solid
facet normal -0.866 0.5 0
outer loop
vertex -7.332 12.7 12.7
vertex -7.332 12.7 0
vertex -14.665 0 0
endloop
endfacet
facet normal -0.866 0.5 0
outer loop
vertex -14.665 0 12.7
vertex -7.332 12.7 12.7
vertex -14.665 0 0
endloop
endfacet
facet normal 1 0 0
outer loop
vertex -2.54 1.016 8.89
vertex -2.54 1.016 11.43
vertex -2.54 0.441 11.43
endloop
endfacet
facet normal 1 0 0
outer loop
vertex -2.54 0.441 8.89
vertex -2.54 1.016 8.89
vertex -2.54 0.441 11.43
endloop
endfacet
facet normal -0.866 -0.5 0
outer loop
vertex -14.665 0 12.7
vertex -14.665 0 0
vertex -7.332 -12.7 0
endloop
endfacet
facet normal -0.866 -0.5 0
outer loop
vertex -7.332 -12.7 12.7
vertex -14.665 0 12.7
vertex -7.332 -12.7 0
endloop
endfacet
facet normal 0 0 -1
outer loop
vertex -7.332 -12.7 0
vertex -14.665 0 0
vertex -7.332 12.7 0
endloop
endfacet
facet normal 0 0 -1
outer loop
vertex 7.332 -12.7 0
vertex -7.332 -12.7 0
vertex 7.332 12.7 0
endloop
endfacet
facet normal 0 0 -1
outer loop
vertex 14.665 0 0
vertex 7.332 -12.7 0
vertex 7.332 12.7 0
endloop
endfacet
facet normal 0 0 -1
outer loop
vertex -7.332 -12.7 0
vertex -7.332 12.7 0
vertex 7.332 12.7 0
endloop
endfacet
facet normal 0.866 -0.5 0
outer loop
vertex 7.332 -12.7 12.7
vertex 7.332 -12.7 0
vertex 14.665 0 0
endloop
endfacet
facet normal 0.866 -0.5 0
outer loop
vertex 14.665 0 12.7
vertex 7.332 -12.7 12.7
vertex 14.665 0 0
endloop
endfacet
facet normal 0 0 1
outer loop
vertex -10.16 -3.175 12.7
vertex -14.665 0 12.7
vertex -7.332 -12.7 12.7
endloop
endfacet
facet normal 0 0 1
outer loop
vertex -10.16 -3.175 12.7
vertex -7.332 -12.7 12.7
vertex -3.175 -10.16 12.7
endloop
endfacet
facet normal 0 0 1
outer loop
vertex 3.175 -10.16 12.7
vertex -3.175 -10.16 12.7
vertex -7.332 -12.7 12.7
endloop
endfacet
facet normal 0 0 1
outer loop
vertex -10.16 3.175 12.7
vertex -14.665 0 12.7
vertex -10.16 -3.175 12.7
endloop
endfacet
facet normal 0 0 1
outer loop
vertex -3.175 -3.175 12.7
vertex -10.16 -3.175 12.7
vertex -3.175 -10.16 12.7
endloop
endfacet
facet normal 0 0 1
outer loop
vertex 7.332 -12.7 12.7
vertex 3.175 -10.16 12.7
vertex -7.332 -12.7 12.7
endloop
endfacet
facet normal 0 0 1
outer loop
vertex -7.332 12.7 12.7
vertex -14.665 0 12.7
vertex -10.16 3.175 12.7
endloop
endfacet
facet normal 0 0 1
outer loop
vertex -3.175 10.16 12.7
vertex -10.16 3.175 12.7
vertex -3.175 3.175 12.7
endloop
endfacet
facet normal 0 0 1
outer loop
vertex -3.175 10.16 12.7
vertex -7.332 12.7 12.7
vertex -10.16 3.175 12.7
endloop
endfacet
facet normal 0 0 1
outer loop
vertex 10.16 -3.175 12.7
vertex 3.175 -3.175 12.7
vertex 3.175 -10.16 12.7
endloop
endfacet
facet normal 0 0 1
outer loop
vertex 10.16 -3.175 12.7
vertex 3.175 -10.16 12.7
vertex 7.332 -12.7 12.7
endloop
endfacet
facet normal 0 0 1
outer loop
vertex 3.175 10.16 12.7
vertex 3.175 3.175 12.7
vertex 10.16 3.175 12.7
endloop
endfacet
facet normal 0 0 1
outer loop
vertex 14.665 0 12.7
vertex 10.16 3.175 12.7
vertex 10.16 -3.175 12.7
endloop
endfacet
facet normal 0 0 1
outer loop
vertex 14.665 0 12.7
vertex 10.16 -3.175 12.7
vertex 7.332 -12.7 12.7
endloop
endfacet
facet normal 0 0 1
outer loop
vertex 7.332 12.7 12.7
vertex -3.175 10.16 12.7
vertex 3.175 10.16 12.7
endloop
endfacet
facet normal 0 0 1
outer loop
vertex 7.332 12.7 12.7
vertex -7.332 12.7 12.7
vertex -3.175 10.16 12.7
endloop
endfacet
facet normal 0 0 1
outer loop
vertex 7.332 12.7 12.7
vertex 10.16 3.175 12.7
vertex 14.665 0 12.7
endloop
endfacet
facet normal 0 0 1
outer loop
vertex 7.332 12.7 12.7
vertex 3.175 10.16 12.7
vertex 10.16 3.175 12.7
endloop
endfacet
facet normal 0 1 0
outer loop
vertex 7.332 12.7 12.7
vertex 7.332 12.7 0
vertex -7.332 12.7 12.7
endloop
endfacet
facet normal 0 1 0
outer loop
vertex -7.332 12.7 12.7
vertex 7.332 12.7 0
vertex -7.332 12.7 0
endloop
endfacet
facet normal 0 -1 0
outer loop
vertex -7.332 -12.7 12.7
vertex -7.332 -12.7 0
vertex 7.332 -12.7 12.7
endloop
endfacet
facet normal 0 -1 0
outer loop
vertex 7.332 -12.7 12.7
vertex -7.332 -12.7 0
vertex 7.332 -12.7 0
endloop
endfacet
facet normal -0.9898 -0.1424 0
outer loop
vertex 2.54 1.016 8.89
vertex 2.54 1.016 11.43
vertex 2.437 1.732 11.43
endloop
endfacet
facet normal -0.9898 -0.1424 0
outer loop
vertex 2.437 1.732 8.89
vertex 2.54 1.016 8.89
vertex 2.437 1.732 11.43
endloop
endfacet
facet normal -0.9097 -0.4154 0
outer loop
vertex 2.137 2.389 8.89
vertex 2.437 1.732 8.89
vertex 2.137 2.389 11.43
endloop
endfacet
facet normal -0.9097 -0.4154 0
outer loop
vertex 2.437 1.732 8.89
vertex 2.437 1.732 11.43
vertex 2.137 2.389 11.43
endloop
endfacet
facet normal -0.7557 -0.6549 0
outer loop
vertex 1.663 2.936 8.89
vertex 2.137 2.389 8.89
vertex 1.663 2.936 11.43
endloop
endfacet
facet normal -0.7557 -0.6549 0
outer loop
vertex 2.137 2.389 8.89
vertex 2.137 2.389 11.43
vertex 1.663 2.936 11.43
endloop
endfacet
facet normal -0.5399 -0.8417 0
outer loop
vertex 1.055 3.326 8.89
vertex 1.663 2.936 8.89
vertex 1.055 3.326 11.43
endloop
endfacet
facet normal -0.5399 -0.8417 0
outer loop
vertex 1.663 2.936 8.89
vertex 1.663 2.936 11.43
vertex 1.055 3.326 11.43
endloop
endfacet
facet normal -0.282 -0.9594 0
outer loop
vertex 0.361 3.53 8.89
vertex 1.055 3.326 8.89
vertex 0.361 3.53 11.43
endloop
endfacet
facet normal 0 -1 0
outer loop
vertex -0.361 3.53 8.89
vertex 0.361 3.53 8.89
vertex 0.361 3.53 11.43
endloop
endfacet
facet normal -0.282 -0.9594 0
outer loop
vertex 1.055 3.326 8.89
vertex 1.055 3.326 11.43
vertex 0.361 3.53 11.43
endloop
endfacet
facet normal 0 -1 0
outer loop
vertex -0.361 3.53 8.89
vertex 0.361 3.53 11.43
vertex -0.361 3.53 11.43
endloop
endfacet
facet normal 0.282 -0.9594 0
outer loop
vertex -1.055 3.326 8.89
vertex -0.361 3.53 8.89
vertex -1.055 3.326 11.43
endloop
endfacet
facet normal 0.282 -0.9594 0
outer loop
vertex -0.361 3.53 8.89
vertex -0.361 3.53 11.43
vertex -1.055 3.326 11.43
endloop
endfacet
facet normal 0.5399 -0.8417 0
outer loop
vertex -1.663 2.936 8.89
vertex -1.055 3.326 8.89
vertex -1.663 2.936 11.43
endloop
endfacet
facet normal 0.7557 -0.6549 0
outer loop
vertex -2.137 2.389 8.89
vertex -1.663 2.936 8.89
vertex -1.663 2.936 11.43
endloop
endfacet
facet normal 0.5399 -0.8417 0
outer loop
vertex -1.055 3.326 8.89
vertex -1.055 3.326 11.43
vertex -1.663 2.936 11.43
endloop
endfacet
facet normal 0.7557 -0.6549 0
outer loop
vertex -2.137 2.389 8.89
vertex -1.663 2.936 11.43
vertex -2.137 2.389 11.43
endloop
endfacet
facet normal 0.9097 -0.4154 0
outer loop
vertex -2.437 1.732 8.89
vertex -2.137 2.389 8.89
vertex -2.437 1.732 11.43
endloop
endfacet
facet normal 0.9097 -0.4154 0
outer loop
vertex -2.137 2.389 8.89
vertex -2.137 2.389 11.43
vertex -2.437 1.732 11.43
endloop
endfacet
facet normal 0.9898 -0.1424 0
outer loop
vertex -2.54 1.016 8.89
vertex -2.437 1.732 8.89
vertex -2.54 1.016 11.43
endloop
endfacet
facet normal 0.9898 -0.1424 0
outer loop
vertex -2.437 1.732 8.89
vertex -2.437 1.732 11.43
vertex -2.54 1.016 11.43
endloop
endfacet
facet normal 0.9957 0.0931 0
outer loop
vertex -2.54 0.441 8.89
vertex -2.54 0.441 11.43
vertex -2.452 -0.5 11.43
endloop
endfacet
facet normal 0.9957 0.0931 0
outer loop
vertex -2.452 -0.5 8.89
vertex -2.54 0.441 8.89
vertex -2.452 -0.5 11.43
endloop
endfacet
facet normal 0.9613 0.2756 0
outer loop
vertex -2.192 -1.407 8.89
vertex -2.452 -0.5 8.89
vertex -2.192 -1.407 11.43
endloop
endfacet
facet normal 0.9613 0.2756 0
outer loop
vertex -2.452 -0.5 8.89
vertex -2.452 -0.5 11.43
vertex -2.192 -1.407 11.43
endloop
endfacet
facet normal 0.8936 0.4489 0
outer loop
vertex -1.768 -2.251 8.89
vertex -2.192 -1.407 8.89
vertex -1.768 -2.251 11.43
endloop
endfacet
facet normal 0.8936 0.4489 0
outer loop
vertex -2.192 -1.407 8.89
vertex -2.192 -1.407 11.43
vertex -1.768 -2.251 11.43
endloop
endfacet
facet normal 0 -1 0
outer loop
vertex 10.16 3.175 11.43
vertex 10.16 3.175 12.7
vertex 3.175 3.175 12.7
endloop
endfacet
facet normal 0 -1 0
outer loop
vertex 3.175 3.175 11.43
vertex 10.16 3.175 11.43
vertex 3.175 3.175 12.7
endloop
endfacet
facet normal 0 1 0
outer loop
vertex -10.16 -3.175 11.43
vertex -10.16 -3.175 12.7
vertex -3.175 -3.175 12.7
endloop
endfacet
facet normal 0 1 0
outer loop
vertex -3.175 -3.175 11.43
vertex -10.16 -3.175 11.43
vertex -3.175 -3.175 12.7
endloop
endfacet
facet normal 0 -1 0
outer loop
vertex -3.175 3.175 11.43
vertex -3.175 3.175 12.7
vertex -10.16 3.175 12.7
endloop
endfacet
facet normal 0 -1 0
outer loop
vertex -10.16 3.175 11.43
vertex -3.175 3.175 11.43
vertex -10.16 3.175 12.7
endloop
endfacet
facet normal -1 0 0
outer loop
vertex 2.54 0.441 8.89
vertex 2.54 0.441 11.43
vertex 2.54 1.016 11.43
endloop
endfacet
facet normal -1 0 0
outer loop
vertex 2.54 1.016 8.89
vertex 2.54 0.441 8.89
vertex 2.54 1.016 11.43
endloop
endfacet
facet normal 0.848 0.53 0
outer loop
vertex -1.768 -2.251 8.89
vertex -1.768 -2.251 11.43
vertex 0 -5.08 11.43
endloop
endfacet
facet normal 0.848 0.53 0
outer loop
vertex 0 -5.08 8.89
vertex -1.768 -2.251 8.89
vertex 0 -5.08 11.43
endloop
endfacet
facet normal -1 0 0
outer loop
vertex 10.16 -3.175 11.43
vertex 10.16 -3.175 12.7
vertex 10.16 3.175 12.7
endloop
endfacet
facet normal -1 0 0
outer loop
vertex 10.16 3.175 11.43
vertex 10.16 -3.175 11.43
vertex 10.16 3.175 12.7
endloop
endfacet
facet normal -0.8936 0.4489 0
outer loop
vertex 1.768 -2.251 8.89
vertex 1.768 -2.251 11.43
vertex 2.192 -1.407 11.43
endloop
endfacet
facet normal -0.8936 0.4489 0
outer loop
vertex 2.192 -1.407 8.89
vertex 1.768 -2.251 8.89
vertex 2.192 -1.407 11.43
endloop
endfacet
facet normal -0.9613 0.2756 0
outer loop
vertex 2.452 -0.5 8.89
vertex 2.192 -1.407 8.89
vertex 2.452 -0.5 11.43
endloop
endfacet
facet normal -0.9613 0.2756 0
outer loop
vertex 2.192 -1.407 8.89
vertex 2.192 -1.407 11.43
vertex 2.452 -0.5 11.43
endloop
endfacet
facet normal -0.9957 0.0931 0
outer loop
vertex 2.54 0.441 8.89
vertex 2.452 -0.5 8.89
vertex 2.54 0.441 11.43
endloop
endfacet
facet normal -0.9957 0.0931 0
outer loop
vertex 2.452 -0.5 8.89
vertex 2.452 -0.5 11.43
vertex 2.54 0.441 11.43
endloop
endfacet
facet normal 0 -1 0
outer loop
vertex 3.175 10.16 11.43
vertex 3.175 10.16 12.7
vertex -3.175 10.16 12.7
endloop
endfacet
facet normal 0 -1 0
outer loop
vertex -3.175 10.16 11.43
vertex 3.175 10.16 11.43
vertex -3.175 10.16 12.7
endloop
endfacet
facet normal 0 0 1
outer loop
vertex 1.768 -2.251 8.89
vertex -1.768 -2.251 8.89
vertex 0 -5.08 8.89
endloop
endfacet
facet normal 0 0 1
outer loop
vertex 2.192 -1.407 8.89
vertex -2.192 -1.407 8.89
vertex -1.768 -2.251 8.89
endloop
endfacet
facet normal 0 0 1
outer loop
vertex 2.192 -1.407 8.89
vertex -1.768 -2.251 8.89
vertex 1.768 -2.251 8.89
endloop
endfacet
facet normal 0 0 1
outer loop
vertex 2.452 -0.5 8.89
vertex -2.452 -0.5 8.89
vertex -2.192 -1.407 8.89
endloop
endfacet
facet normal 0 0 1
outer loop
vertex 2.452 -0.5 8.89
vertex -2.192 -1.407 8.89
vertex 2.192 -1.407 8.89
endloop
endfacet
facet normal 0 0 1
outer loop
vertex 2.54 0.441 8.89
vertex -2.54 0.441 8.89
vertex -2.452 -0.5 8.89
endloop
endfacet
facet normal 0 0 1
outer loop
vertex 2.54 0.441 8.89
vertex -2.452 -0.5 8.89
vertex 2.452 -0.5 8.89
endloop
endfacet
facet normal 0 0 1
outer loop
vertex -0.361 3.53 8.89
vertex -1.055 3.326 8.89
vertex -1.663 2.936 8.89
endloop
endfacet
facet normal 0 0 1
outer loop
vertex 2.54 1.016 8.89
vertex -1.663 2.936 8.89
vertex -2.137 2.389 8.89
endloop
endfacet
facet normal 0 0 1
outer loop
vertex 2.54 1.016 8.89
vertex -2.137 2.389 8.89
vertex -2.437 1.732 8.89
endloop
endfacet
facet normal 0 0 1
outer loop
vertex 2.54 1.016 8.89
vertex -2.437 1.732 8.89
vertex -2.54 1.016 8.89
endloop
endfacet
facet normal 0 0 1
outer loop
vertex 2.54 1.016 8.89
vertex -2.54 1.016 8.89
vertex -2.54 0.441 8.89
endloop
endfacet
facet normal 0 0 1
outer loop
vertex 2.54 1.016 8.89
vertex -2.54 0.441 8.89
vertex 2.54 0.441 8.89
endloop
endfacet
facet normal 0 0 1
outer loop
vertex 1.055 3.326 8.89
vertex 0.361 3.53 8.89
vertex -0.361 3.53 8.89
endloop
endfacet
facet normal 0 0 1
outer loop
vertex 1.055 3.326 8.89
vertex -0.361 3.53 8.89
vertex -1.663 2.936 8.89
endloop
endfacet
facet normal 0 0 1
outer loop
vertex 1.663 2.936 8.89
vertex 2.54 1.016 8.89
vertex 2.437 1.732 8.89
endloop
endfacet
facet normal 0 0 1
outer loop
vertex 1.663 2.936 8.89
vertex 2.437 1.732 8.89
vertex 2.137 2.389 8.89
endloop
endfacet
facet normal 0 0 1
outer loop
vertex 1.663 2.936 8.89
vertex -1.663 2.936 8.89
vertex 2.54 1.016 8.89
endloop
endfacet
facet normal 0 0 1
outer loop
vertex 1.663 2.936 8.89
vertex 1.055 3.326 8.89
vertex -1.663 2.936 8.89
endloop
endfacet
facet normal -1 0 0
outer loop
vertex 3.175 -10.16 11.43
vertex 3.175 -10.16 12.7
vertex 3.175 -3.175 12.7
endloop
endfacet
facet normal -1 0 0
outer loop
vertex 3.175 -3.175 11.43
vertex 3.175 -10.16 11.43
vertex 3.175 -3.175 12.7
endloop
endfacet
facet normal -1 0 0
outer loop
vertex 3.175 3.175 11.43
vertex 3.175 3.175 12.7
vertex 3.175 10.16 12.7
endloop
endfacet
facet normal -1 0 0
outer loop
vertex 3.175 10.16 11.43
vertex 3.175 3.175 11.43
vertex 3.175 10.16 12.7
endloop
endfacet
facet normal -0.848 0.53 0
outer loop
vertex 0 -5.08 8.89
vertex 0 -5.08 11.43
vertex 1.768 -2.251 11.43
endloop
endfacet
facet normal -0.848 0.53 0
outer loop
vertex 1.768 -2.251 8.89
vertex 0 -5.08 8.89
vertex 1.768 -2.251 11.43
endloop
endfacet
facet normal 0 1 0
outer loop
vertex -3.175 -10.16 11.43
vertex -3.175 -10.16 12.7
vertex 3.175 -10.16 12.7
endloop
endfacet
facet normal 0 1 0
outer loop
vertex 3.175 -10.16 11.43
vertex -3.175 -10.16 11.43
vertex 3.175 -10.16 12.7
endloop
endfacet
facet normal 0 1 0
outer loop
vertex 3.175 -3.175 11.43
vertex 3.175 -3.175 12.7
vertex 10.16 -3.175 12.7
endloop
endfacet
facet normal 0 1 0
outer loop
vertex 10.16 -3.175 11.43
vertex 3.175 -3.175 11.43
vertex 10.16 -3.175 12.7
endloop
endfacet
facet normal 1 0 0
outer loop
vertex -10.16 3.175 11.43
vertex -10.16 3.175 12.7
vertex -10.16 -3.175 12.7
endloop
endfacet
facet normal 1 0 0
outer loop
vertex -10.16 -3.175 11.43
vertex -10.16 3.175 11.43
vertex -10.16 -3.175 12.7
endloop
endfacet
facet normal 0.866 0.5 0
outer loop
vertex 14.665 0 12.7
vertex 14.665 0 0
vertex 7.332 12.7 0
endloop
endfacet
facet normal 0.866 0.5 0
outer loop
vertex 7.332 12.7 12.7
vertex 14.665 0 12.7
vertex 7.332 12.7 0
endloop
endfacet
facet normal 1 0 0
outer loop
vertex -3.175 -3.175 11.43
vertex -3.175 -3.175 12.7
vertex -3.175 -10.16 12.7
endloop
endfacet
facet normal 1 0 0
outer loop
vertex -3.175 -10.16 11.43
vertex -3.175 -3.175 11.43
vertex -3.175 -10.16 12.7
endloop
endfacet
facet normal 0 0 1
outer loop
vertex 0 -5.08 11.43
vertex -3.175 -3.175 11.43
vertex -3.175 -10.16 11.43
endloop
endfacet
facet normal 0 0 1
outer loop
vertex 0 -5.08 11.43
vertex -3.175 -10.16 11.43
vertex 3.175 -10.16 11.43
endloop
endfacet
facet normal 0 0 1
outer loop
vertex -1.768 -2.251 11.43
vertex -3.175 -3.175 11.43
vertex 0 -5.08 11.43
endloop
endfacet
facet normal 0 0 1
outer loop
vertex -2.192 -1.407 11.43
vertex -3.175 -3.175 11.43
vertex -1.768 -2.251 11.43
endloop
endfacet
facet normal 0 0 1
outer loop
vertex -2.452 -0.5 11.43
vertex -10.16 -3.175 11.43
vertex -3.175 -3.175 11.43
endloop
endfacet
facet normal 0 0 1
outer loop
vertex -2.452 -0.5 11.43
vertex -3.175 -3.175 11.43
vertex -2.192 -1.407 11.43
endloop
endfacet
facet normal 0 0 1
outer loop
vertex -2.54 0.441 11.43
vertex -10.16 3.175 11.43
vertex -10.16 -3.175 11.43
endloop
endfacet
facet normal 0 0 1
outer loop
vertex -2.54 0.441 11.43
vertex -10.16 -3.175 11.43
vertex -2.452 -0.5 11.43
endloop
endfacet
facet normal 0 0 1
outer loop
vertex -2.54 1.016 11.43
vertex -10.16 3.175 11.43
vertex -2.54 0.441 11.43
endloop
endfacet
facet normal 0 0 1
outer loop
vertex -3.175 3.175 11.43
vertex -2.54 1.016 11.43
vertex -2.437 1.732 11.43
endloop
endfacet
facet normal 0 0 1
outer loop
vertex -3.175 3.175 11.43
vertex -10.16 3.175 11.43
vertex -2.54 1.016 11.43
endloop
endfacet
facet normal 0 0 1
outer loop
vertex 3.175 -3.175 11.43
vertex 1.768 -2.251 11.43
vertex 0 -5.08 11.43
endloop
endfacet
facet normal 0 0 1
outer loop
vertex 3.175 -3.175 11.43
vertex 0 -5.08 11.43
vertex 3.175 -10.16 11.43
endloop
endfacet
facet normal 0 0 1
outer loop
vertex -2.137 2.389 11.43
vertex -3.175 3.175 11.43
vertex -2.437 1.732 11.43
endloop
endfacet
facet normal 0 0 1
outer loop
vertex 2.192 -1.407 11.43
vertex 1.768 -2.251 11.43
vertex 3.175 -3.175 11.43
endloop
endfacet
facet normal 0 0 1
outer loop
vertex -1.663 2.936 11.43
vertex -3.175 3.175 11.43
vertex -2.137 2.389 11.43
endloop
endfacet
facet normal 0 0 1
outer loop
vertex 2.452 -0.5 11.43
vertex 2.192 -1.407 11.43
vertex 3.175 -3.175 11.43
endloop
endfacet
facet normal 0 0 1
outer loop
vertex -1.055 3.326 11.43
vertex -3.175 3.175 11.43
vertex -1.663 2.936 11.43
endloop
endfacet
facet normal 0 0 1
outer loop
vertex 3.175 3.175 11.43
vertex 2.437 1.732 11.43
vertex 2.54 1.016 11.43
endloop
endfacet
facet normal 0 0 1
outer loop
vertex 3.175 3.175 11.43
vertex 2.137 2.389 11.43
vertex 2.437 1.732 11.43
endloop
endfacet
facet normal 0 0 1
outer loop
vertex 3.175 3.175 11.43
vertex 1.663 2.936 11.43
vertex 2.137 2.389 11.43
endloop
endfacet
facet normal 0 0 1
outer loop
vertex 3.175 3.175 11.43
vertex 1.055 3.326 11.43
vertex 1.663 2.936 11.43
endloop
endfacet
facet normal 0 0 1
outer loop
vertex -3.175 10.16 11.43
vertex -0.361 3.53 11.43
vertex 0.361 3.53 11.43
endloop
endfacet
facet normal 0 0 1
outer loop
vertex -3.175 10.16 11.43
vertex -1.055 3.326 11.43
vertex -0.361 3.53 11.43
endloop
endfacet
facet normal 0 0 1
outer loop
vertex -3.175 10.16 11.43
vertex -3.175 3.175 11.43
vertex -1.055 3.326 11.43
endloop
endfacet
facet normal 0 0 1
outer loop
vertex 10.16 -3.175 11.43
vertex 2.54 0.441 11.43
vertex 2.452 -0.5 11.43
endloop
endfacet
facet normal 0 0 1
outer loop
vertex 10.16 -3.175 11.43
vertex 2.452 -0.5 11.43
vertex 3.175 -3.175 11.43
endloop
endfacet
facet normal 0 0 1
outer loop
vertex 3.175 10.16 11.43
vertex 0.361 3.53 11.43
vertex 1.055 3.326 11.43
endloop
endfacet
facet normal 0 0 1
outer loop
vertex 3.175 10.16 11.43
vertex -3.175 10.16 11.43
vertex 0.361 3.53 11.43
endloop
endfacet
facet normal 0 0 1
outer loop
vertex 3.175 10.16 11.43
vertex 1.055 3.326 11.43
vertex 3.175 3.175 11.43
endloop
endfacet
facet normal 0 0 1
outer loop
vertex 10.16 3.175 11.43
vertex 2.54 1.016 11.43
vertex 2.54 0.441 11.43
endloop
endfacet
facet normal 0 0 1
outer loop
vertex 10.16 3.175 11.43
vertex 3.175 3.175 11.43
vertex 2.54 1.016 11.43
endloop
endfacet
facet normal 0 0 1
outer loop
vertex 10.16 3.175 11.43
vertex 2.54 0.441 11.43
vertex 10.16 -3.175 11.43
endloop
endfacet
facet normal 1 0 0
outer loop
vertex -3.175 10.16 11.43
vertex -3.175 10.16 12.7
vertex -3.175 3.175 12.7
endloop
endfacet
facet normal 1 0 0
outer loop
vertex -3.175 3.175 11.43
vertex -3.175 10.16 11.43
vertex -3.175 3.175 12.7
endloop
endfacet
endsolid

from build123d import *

# Parameters (mm, degrees)
F1_DEPTH = 12.7
F3_DEPTH = 1.27
F5_DEPTH = 2.54


with BuildPart() as f1:
    # F0 (on Top) → F1 (new body)
    with BuildSketch(Plane.XY):
        Polygon((14.664697, 0), (7.332348, 12.7), (-7.332348, 12.7), (-14.664697, 0), (-7.332348, -12.7), (7.332348, -12.7), align=None)
    extrude(amount=F1_DEPTH)

    # F2 (on face) → F3 (cut)
    with BuildSketch(Plane.XY.offset(12.7)):
        Polygon((3.175, 10.16), (-3.175, 10.16), (-3.175, 3.175), (-10.16, 3.175), (-10.16, -3.175), (-3.175, -3.175), (-3.175, -10.16), (3.175, -10.16), (3.175, -3.175), (10.16, -3.175), (10.16, 3.175), (3.175, 3.175), align=None)
    extrude(amount=-F3_DEPTH, mode=Mode.SUBTRACT)

    # F4 (on face) → F5 (cut)
    with BuildSketch(Plane.XY.offset(11.43)):
        with BuildLine():
            Line((2.54, 0.440925), (2.54, 1.016))
            ThreePointArc((2.54, 1.016), (0, 3.556), (-2.54, 1.016))
            Line((-2.54, 1.016), (-2.54, 0.440925))
            ThreePointArc((-2.54, 0.440925), (-2.343144, -0.959542), (-1.767831, -2.25147))
            Line((-1.767831, -2.25147), (0, -5.08))
            Line((0, -5.08), (1.767831, -2.25147))
            ThreePointArc((1.767831, -2.25147), (2.343144, -0.959542), (2.54, 0.440925))
        make_face()
    extrude(amount=-F5_DEPTH, mode=Mode.SUBTRACT)


solid = f1.part
